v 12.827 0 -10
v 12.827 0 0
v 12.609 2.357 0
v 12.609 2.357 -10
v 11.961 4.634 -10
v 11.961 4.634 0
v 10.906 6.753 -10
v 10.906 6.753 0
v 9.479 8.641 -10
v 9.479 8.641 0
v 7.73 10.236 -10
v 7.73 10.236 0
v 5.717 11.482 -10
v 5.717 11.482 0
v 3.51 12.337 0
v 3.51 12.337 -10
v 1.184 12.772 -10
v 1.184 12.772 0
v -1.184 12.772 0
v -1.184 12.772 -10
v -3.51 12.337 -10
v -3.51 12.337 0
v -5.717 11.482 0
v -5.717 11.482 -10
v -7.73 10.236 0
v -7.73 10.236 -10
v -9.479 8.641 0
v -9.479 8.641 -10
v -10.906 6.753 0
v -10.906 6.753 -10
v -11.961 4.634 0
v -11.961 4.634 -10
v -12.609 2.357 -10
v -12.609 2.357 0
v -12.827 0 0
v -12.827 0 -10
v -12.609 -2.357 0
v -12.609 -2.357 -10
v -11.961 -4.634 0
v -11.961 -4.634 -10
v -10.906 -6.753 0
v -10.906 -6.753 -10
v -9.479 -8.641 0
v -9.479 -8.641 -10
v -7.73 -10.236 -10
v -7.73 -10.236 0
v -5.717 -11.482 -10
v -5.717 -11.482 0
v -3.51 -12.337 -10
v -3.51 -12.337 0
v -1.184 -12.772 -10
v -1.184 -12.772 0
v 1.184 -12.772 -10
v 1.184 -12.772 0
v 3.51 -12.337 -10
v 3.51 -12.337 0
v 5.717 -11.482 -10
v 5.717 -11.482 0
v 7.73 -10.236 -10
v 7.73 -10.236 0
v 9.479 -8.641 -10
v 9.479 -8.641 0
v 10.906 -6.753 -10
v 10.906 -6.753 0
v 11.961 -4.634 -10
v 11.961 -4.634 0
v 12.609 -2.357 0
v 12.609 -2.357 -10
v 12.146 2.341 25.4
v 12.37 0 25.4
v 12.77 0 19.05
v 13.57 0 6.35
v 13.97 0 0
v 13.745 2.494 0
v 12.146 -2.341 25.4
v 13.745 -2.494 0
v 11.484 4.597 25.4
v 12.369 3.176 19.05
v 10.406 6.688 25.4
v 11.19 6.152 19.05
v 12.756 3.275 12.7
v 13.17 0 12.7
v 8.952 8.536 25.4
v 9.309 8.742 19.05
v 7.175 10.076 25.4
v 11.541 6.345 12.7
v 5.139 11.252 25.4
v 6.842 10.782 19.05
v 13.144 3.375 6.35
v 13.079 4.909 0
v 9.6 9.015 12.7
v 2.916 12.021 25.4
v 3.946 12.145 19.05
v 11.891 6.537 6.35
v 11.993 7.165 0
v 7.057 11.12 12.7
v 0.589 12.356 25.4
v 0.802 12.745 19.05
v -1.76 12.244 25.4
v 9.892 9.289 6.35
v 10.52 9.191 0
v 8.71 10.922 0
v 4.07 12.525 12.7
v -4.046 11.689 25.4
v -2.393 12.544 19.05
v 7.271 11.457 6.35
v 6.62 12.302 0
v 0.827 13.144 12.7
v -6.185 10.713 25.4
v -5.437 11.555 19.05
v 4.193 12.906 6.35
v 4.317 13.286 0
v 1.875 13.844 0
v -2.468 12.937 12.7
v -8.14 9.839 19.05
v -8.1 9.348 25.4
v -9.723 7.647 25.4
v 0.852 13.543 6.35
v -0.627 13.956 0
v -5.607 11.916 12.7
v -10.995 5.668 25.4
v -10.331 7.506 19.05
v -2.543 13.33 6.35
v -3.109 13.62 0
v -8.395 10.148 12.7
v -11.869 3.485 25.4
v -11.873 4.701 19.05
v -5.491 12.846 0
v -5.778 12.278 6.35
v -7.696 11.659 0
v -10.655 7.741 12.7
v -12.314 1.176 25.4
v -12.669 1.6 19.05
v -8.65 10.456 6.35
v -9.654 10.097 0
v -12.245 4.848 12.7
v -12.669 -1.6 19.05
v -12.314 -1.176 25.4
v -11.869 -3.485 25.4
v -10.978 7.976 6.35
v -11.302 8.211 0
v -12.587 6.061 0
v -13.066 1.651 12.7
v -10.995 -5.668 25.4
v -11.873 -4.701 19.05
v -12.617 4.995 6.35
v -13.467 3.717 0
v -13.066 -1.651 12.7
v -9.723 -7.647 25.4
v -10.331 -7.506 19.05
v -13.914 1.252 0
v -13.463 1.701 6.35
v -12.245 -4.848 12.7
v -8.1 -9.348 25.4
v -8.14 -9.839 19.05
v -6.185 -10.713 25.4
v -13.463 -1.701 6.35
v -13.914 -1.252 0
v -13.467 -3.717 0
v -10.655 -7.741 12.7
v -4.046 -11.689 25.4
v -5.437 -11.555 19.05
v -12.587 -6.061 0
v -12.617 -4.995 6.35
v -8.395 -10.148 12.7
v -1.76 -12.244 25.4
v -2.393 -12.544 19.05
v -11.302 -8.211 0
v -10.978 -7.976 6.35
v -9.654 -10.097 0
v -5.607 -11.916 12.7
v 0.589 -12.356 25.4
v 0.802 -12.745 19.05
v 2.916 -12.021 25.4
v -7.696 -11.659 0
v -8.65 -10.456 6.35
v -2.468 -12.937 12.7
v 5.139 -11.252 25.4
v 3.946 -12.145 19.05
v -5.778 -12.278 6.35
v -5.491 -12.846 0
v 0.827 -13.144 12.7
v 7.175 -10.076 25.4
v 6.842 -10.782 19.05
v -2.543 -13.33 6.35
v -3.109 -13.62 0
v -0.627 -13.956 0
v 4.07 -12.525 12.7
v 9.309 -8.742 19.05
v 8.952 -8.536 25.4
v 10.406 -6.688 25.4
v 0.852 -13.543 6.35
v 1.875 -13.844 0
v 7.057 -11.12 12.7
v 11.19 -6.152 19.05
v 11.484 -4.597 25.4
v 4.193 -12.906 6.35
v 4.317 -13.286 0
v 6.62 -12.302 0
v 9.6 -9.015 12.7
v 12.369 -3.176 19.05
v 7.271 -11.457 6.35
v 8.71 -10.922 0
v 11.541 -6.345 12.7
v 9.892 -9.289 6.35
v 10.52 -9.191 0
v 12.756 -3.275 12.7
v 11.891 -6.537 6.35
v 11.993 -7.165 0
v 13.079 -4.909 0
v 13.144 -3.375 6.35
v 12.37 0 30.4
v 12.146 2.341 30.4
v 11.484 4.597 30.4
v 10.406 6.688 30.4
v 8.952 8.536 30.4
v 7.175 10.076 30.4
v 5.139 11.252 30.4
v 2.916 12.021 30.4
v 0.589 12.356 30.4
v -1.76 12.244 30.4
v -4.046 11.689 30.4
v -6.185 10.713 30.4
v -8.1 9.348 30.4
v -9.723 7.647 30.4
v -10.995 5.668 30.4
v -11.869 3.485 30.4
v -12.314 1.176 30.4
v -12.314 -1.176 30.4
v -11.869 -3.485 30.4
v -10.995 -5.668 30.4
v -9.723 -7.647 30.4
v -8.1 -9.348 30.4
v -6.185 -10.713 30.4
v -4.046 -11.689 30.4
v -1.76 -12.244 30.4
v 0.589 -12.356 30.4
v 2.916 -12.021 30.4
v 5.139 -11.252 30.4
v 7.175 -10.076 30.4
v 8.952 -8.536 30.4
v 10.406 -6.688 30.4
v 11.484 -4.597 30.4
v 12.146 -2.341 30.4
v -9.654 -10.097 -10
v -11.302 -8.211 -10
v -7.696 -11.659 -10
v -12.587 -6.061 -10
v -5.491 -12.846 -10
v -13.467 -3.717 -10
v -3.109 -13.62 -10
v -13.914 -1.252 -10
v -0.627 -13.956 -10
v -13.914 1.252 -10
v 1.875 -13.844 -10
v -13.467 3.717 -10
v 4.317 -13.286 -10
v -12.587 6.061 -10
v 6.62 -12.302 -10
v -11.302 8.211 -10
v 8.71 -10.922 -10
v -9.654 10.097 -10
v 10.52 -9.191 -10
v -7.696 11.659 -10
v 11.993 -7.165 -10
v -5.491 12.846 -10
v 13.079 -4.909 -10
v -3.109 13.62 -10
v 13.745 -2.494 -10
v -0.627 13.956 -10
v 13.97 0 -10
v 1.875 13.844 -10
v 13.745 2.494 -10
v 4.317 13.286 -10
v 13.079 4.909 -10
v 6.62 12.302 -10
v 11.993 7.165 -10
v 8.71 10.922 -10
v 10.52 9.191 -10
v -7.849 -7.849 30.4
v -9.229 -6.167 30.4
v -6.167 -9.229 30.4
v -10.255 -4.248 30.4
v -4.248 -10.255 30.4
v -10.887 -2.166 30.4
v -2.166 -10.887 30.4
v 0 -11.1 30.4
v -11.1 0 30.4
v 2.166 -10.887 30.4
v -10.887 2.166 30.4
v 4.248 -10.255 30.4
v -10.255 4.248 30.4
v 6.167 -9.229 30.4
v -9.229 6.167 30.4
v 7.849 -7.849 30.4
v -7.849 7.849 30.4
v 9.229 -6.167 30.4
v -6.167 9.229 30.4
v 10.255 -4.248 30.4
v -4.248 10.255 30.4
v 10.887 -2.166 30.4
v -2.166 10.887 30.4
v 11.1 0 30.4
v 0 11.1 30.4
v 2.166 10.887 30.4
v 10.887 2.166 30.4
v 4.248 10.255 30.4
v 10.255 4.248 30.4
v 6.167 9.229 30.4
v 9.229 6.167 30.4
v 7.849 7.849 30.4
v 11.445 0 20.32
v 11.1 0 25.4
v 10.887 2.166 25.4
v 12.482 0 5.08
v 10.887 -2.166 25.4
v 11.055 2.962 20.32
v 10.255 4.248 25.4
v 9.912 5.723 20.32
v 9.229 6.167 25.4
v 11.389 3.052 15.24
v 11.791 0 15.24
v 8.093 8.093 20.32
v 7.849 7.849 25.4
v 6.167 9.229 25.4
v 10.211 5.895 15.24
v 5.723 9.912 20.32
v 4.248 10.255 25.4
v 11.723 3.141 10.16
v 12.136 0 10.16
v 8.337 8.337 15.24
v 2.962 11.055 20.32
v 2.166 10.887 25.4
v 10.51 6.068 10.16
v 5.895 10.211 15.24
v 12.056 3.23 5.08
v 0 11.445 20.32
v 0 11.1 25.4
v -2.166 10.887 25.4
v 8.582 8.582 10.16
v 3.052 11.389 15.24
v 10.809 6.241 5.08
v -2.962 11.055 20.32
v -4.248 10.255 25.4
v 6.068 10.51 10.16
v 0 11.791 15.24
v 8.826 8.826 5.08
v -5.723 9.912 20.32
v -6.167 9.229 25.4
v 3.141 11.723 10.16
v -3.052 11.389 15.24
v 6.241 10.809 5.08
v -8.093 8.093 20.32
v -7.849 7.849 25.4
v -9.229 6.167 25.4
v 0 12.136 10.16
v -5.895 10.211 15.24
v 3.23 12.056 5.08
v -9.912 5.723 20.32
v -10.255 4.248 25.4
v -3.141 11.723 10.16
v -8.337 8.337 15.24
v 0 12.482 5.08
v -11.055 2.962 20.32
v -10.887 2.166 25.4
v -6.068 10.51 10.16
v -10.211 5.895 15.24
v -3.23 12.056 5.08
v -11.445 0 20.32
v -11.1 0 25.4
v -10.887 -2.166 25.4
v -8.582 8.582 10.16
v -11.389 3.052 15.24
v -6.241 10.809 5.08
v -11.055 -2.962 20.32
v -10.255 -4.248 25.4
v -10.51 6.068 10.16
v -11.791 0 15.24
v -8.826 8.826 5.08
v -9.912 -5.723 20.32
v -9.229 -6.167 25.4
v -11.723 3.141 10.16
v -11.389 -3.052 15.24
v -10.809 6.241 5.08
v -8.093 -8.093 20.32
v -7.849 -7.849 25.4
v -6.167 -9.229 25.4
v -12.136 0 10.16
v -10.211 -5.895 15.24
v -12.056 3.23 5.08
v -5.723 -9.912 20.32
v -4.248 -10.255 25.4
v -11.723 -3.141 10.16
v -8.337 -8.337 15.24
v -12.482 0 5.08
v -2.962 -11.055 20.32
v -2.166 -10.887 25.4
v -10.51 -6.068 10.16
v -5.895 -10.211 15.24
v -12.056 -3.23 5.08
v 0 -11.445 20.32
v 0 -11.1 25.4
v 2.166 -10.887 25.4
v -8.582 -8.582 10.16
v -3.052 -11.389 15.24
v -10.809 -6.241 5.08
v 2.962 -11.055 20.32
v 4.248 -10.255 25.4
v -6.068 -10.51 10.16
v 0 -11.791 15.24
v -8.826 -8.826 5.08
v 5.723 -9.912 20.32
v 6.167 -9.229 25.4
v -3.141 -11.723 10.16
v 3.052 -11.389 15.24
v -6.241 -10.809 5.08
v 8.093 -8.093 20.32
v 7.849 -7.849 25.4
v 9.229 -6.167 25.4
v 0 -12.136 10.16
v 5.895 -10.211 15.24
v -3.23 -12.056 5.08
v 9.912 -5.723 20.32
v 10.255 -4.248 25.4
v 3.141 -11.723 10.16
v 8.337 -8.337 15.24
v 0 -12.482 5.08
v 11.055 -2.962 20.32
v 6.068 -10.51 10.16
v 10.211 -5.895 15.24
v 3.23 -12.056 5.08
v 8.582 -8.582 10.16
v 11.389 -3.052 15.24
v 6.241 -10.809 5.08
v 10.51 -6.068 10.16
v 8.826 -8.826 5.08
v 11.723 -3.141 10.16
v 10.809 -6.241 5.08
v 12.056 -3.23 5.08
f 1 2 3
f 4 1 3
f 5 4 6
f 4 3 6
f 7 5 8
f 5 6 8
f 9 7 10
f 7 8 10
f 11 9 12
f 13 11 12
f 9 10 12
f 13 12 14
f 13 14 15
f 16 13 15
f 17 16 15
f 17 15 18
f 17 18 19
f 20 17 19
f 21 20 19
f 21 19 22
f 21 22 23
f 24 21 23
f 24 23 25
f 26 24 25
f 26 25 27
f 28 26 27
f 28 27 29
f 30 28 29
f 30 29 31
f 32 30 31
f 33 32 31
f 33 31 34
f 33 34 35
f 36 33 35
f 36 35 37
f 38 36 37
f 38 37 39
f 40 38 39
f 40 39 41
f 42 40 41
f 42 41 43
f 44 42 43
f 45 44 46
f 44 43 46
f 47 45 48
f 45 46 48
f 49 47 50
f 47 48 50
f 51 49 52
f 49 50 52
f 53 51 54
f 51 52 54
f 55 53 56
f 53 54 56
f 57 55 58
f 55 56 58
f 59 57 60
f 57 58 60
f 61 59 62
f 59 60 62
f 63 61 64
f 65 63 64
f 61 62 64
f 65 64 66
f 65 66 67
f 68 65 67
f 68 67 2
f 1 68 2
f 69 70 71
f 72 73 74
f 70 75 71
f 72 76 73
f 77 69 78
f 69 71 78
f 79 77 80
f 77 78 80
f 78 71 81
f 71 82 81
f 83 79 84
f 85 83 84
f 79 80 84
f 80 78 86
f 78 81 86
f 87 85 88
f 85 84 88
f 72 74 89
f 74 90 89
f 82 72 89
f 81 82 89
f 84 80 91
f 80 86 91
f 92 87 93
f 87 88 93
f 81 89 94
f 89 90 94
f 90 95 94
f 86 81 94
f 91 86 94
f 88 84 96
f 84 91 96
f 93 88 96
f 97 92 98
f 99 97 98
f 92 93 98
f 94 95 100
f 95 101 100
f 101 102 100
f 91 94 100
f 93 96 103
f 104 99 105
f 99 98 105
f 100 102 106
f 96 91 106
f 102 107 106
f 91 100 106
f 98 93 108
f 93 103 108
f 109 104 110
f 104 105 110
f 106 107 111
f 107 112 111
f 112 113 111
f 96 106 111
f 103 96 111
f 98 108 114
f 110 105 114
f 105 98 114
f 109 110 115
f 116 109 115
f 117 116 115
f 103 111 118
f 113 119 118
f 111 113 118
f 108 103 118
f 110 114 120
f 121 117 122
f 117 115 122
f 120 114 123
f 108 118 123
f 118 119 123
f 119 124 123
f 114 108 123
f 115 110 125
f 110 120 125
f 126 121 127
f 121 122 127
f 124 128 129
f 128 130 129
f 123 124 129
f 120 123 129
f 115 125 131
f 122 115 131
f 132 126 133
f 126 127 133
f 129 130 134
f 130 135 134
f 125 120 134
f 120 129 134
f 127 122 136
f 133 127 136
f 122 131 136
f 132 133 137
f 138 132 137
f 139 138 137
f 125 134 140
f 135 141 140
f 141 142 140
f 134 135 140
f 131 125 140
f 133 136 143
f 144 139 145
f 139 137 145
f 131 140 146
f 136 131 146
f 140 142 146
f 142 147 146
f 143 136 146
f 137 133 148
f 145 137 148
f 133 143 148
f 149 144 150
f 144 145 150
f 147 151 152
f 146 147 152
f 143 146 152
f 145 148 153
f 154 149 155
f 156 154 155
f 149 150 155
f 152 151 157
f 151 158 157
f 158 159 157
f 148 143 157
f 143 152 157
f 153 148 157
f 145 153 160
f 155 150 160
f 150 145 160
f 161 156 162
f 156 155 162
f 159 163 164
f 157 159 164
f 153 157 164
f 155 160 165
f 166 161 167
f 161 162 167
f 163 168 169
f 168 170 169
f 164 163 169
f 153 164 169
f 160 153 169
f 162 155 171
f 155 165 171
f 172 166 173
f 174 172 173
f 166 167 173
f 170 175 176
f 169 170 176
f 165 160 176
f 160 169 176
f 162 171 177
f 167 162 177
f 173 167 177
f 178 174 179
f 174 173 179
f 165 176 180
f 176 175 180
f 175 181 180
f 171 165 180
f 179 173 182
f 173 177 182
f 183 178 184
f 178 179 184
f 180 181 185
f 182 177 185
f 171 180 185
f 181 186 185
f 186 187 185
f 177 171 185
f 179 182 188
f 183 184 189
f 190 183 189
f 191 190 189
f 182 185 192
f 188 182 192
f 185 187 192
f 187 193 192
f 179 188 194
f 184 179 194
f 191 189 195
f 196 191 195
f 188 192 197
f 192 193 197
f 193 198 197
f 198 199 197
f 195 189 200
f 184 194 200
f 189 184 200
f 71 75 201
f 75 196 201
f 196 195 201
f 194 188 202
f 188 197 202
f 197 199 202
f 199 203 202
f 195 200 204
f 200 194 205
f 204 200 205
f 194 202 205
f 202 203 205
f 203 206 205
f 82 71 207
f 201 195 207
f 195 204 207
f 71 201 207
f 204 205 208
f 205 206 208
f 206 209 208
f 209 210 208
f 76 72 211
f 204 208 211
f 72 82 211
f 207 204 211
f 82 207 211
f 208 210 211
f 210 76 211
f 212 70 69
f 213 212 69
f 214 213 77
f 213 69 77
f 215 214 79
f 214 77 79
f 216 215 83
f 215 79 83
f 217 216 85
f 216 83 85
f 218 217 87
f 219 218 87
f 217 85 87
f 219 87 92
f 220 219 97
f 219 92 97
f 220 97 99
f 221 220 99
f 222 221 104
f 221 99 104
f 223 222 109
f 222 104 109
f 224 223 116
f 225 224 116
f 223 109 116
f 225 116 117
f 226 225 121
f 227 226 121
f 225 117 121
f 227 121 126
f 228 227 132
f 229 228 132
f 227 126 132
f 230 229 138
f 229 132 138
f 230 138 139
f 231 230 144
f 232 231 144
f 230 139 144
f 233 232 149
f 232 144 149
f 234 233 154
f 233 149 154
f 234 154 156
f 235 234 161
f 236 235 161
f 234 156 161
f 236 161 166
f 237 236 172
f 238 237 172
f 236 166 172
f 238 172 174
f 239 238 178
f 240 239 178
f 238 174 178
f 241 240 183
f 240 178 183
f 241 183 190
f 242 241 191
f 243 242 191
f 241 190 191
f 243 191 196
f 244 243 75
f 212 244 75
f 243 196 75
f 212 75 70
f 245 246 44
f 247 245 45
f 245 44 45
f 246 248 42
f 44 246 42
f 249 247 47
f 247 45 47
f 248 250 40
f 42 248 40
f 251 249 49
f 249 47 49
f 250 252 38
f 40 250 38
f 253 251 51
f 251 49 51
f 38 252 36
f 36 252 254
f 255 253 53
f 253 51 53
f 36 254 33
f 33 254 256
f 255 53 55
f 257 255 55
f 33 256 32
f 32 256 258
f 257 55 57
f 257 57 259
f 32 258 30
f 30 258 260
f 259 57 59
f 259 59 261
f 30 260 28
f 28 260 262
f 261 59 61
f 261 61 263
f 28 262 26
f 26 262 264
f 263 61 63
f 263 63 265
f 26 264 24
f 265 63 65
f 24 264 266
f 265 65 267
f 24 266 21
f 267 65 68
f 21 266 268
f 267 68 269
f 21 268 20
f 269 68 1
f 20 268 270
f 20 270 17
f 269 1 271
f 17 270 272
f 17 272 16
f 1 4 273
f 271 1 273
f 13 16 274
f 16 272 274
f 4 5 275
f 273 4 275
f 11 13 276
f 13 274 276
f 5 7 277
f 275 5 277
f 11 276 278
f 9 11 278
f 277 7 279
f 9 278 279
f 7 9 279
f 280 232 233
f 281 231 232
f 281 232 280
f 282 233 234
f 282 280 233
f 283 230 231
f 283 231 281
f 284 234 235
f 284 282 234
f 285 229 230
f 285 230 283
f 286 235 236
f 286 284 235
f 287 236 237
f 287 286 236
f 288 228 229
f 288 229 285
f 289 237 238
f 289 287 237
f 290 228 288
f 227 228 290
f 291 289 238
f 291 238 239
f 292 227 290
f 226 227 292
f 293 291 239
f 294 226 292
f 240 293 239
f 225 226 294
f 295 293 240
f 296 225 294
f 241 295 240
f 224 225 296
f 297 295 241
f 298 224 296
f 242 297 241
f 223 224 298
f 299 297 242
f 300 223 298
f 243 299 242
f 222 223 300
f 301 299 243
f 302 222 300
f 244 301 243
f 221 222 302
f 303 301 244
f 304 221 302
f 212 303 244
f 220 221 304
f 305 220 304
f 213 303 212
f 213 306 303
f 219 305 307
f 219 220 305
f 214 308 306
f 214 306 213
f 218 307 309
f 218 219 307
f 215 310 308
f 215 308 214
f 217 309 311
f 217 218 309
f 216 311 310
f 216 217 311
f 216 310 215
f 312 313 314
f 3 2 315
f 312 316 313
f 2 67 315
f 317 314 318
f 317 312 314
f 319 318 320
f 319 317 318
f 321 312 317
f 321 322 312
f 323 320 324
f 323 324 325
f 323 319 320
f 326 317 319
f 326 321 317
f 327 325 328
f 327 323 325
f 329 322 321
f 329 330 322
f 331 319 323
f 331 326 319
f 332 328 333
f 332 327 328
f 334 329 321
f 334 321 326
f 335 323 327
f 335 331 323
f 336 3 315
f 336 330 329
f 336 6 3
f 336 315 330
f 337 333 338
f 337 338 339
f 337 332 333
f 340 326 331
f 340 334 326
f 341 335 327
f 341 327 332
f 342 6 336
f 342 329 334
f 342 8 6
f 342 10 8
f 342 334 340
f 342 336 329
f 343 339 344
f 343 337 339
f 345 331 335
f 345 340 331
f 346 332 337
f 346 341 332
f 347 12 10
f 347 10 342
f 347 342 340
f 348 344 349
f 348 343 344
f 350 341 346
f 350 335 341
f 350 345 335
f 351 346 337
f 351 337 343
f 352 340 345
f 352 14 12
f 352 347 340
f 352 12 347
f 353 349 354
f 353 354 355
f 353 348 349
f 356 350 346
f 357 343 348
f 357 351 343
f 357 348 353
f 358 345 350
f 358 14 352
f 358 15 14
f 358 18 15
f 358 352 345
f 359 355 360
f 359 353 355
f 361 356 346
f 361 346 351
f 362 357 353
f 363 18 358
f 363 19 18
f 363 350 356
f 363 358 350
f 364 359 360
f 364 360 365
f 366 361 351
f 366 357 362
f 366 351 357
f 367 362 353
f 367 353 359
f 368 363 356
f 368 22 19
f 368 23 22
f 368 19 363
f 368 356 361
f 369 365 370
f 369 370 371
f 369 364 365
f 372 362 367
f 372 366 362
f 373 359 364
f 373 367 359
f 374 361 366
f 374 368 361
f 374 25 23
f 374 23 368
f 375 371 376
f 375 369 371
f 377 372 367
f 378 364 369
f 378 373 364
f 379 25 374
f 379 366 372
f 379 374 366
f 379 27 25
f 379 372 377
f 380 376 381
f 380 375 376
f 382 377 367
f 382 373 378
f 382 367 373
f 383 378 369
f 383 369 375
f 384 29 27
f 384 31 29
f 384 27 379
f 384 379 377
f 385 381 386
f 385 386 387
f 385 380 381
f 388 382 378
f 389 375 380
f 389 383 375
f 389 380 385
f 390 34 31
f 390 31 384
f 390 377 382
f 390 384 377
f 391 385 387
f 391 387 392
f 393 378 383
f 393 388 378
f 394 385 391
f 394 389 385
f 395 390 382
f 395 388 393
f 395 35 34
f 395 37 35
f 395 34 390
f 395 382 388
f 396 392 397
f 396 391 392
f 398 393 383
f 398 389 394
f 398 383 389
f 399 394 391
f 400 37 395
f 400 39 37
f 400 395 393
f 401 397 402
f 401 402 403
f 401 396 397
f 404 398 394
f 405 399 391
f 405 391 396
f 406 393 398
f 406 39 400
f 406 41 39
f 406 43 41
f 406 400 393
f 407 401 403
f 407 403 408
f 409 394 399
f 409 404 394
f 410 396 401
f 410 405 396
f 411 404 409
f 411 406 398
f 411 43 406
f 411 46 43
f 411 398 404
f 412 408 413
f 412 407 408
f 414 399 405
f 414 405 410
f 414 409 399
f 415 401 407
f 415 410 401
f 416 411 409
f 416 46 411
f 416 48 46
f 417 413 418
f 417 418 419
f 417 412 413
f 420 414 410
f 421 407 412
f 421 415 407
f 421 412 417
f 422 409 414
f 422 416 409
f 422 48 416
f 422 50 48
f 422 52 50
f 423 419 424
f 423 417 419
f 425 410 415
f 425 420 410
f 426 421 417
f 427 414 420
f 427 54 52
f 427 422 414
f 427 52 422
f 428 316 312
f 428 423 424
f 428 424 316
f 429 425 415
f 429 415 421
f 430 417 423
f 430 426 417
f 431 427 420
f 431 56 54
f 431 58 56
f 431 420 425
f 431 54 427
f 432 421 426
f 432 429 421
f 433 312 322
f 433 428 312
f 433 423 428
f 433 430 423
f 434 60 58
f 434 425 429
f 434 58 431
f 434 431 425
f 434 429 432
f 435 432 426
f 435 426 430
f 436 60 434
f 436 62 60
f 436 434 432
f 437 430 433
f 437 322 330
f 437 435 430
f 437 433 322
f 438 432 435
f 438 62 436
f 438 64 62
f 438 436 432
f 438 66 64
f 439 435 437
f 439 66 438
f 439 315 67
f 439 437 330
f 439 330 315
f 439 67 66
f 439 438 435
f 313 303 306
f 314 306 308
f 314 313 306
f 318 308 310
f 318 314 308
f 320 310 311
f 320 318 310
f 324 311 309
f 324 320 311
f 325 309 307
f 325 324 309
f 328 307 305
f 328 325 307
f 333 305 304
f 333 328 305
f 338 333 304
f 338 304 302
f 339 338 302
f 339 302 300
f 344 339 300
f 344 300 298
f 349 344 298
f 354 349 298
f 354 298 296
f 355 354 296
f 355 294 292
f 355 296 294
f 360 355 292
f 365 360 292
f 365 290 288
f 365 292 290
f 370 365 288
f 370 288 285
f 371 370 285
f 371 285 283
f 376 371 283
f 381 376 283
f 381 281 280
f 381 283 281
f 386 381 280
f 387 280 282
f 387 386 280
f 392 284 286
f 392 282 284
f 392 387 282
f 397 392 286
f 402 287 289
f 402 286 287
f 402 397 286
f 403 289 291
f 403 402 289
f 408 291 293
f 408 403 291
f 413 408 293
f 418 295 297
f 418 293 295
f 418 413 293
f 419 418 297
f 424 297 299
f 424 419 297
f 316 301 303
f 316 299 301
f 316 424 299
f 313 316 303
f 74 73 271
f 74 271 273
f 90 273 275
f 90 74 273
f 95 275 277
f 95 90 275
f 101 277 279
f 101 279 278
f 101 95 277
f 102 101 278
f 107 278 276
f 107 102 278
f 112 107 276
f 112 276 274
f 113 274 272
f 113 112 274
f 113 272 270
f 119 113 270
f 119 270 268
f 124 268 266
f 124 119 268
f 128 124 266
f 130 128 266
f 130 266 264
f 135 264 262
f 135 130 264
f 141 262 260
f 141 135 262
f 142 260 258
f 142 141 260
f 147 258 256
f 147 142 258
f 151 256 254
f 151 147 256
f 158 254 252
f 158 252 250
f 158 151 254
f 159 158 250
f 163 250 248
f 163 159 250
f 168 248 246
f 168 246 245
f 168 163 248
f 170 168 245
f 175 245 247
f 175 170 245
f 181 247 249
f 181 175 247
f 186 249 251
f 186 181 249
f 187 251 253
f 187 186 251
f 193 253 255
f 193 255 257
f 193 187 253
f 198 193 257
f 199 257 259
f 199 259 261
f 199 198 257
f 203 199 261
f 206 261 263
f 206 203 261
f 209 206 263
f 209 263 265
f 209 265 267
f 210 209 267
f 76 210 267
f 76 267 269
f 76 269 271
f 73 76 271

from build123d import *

# Parameters (mm, degrees)
F3_R      = 12.3698
F4_R      = 13.97
F1_R      = 11.1
F2_R      = 12.827
F7_DEPTH  = 5
F8_DEPTH  = 25.4
F9_DEPTH  = 10
F10_DEPTH = 25.4


with BuildPart() as f5:
    # F3 (on offset) → F5 section 0
    with BuildSketch(Plane.XY.offset(25.4)):
        Circle(F3_R)
    # F4 (on Top) → F5 section 1
    with BuildSketch(Plane.XY):
        Circle(F4_R)
    loft()

    # F1 (on offset) → F6 section 0
    with BuildSketch(Plane.XY.offset(25.4)):
        Circle(F1_R)
    # F2 (on Top) → F6 section 1
    with BuildSketch(Plane.XY):
        Circle(F2_R)
    loft(mode=Mode.SUBTRACT)

    # F3 (on offset) → F7 (join)
    with BuildSketch(Plane.XY.offset(25.4)):
        Circle(F3_R)
    extrude(amount=F7_DEPTH)

    # F1 (on offset) → F8 (cut)
    with BuildSketch(Plane.XY.offset(25.4)):
        Circle(F1_R)
    extrude(amount=F8_DEPTH, mode=Mode.SUBTRACT)

    # F4 (on Top) → F9 (join)
    with BuildSketch(Plane.XY):
        Circle(F4_R)
    extrude(amount=-F9_DEPTH)

    # F2 (on Top) → F10 (cut)
    with BuildSketch(Plane.XY):
        Circle(F2_R)
    extrude(amount=-F10_DEPTH, mode=Mode.SUBTRACT)


solid = f5.part
